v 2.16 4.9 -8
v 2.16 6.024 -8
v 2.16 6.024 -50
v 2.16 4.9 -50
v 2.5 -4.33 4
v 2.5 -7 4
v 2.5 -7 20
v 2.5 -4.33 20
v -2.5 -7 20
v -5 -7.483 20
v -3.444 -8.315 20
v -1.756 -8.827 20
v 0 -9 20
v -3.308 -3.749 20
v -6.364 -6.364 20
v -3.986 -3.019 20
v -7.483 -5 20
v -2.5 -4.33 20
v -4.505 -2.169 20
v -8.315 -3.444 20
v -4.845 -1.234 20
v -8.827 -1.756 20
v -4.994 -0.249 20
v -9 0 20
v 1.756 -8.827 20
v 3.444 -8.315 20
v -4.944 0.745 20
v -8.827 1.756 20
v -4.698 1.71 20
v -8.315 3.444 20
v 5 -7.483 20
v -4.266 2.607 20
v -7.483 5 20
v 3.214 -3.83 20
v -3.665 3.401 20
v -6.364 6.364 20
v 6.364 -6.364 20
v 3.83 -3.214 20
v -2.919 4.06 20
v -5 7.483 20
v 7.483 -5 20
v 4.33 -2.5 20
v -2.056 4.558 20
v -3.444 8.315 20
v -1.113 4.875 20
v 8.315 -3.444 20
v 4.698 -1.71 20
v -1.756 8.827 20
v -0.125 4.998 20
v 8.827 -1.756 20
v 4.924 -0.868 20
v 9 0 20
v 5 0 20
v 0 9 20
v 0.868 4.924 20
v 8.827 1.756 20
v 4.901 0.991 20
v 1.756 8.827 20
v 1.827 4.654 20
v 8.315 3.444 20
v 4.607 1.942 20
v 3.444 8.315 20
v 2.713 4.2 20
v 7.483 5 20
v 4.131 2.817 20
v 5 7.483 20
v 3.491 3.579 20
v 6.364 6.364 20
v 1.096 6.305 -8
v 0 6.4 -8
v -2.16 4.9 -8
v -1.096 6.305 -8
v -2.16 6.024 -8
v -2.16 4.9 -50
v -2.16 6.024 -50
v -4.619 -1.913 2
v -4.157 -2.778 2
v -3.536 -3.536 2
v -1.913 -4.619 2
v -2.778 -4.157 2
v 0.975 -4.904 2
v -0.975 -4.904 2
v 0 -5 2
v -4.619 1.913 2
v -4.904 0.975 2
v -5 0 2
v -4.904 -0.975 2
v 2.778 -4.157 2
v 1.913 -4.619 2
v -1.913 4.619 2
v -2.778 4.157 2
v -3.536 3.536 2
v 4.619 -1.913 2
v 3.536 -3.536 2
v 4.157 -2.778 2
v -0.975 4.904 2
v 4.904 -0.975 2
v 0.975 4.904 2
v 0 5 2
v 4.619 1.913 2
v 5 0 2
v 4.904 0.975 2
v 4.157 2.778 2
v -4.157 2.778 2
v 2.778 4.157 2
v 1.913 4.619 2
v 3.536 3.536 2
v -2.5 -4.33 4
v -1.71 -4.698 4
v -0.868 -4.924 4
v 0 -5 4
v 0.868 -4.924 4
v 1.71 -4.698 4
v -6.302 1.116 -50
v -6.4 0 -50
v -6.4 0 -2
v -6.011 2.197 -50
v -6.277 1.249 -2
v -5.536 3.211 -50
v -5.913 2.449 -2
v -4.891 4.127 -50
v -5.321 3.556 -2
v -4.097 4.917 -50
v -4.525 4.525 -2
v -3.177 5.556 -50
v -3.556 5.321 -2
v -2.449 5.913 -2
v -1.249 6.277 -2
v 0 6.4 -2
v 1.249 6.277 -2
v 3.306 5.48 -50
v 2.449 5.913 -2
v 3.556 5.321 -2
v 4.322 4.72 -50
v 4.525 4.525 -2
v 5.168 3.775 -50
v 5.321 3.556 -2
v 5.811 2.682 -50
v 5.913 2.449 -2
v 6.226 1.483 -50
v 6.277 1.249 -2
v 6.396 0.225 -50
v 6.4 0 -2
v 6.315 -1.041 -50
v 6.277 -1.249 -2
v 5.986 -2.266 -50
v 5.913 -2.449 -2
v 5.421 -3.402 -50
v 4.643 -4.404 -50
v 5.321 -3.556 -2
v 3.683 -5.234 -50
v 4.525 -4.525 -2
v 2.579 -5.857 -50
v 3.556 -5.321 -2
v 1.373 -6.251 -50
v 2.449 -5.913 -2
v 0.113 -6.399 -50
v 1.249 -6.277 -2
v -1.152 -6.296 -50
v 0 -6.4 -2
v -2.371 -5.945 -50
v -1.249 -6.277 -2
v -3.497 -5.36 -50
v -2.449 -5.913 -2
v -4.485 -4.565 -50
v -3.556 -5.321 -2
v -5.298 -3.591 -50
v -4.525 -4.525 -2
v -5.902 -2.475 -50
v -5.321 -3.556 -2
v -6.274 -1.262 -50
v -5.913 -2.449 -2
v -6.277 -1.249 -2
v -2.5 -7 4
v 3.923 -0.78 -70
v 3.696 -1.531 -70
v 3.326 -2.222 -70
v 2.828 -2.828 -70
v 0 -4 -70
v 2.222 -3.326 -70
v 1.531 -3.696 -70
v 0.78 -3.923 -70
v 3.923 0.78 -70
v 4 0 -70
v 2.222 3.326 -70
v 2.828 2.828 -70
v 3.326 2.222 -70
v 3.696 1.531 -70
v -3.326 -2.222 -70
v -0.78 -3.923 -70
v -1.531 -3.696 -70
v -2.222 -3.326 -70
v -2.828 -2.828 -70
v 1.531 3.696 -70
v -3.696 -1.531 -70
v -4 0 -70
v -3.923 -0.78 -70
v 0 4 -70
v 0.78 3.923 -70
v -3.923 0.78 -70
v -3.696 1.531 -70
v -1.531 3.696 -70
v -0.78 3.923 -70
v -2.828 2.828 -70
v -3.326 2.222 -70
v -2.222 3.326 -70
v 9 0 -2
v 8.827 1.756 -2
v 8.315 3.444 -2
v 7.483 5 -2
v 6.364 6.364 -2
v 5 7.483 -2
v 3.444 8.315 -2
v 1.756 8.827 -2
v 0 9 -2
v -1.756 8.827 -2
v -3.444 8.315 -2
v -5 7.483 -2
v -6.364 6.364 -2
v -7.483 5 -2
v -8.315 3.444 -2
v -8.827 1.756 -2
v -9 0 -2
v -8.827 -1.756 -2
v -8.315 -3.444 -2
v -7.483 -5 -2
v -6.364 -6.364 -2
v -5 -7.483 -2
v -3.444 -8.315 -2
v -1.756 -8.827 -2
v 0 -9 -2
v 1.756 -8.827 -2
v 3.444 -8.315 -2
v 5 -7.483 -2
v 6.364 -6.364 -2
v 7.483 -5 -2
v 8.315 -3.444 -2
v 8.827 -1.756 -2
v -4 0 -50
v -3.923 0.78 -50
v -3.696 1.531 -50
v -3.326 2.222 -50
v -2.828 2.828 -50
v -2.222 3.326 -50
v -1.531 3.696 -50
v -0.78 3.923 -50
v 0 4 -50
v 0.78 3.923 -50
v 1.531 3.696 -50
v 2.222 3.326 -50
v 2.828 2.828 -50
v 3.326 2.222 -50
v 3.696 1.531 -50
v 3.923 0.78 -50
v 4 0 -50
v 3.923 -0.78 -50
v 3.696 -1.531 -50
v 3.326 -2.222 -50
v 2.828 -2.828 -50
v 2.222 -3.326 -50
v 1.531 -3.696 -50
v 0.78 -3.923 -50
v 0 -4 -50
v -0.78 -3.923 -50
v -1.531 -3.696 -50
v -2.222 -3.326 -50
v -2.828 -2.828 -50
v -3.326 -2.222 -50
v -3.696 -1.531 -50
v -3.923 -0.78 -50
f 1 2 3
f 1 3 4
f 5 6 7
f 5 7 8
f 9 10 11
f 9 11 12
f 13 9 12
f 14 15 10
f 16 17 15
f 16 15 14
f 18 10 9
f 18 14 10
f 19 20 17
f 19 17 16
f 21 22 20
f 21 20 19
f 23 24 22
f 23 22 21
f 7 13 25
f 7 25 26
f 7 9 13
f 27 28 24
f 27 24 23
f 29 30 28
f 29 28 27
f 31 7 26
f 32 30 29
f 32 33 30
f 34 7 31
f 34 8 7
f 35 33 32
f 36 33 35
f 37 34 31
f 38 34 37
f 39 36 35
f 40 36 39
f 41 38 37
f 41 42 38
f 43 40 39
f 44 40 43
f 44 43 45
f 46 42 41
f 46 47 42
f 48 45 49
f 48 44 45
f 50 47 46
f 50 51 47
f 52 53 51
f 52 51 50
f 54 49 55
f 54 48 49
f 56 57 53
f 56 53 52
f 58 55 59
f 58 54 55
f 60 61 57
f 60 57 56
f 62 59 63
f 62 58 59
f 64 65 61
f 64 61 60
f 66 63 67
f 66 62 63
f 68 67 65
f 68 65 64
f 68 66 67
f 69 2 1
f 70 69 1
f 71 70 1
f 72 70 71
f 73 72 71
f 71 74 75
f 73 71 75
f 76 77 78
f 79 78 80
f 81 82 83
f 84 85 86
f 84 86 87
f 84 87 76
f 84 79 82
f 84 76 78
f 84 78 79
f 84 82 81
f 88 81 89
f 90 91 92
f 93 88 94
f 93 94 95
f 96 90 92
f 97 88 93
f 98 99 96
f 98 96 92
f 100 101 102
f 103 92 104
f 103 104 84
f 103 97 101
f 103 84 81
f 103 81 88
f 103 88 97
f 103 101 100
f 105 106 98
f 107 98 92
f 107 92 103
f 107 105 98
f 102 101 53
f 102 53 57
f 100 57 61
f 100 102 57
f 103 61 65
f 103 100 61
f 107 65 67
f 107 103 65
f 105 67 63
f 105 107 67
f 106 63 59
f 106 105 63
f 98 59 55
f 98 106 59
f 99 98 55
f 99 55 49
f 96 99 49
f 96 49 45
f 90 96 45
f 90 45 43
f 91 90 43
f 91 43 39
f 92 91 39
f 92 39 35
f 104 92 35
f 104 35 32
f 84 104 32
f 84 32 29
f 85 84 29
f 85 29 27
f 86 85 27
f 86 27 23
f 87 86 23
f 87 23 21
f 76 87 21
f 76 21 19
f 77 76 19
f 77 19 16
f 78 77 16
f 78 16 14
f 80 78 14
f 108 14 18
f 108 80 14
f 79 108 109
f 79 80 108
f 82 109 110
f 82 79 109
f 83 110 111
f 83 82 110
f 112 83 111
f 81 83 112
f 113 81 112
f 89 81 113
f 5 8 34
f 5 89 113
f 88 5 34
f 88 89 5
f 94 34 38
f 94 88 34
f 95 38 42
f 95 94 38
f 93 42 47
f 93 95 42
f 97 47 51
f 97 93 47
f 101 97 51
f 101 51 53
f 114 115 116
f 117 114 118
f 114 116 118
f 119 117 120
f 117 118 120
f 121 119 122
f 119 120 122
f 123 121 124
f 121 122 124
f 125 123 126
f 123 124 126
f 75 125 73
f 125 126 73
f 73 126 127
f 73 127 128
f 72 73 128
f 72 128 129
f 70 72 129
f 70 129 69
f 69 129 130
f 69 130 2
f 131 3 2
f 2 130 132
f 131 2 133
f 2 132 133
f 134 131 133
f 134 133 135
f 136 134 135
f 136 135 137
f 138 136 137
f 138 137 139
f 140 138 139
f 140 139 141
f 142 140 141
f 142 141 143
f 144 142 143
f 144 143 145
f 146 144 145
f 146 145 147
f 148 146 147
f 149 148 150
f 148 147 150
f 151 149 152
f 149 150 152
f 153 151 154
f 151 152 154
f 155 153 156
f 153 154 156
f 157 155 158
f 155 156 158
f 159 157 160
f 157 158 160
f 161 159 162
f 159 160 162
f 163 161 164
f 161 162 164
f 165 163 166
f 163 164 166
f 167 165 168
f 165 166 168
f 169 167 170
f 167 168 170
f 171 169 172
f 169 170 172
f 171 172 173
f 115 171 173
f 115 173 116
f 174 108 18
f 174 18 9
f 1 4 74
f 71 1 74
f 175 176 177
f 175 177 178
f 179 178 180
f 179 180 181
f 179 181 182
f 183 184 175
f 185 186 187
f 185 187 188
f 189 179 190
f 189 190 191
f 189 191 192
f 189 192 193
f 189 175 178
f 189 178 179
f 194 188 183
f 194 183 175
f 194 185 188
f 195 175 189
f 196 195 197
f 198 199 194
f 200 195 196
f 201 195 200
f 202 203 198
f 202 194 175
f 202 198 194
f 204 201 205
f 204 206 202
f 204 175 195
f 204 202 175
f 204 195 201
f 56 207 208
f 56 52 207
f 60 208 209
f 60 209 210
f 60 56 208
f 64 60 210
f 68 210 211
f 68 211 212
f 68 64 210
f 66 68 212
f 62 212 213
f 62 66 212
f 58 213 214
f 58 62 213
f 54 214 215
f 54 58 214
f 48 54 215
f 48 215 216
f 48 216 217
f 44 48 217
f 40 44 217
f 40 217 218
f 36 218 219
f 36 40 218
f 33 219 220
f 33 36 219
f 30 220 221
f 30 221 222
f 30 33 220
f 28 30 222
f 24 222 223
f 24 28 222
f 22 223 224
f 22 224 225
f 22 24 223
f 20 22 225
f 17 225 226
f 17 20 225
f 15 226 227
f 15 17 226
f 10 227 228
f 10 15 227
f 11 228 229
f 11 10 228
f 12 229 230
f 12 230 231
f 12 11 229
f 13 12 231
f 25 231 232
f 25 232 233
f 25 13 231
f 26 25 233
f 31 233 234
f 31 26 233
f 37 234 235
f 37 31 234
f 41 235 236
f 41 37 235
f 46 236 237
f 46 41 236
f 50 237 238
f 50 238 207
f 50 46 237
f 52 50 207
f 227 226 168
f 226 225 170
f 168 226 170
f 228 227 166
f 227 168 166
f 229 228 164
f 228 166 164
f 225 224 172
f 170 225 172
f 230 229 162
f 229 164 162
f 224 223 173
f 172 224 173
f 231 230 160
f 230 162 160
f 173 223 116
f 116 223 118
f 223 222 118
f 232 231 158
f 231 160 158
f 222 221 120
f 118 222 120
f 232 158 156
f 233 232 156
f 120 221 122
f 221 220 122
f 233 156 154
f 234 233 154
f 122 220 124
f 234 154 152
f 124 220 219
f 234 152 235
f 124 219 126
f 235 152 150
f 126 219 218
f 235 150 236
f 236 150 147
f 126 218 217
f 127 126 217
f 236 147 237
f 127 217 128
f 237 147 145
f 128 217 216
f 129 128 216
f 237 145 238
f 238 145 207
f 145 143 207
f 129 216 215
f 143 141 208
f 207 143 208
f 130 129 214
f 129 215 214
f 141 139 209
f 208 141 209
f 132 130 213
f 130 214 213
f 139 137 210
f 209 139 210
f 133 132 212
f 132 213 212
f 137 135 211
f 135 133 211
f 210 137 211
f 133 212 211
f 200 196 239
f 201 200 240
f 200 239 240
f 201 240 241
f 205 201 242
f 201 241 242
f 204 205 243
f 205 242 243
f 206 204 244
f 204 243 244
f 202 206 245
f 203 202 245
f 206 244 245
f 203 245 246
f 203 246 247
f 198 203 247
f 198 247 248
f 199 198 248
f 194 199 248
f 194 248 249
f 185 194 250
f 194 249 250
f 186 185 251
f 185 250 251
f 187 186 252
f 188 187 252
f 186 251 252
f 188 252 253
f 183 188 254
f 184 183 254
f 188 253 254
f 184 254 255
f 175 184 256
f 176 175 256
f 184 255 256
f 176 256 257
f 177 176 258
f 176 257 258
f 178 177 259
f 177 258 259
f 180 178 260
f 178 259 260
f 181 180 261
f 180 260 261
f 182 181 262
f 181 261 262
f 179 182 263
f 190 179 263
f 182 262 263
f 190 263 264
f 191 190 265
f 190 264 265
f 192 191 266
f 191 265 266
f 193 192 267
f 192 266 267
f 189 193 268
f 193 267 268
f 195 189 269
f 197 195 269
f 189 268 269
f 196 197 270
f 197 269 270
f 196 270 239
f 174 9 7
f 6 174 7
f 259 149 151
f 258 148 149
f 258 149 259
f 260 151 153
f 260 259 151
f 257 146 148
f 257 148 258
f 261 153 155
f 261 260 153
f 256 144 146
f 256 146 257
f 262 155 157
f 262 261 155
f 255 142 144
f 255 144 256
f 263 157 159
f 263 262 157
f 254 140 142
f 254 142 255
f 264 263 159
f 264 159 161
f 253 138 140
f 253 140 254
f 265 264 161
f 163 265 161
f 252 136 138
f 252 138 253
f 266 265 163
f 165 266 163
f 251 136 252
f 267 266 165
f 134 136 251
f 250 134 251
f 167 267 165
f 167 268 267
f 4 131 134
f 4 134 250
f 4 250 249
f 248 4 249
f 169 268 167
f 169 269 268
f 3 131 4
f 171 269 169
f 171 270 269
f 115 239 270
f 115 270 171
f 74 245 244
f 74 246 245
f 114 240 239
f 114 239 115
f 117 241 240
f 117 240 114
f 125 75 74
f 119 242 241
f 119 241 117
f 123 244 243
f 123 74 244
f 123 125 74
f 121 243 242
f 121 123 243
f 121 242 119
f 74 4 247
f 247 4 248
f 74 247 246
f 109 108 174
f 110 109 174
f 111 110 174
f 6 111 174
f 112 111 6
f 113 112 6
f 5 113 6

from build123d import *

# Parameters (mm, degrees)
SKETCH1_R           = 9
SKETCH1_R_2         = 5
BOSS_EXTRUDE1_DEPTH = 20
SKETCH3_R           = 6.4
BOSS_EXTRUDE2_DEPTH = 50
CUT_EXTRUDE2_DEPTH  = 16
BOSS_EXTRUDE3_START = -2
SKETCH1_3_R         = 9
BOSS_EXTRUDE3_DEPTH = 2
SKETCH1_4_R         = 5
BOSS_EXTRUDE4_DEPTH = 2
CUT_EXTRUDE3_DEPTH  = 42
SKETCH10_R          = 4
BOSS_EXTRUDE5_DEPTH = 20


with BuildPart() as part:
    # Sketch1 → Boss-Extrude1 (new body)
    with BuildSketch(Plane.XY):
        Circle(SKETCH1_R)
        Circle(SKETCH1_R_2, mode=Mode.SUBTRACT)
    extrude(amount=BOSS_EXTRUDE1_DEPTH)

    # Sketch3 → Boss-Extrude2 (add)
    with BuildSketch(Plane(origin=(0, 0, 0), x_dir=(-1, 0, 0), z_dir=(0, 0, -1))):
        Circle(SKETCH3_R)
    extrude(amount=BOSS_EXTRUDE2_DEPTH)

    # Sketch8 → Cut-Extrude2 (cut)
    with BuildSketch(Plane.XY.offset(20)):
        Polygon((0, -7), (2.5, -7), (2.5, -4.330127019), (-2.5, -4.330127019), (-2.5, -7), align=None)
    extrude(amount=-CUT_EXTRUDE2_DEPTH, mode=Mode.SUBTRACT)

    # Sketch1<3> → Boss-Extrude3 (add)
    with BuildSketch(Plane.XY.offset(BOSS_EXTRUDE3_START)):
        Circle(SKETCH1_3_R)
    extrude(amount=BOSS_EXTRUDE3_DEPTH)

    # Sketch1<4> → Boss-Extrude4 (add)
    with BuildSketch(Plane.XY):
        Circle(SKETCH1_4_R)
    extrude(amount=BOSS_EXTRUDE4_DEPTH)

    # Sketch9 → Cut-Extrude3 (cut)
    with BuildSketch(Plane(origin=(0, 0, -50), x_dir=(-1, 0, 0), z_dir=(0, 0, -1))):
        Polygon((0, 4.9), (2.16, 4.9), (2.16, 6.02448338), (0.743273512, 7.441209868), (-1.718196928, 7.441209868), (-2.16, 6.02448338), (-2.16, 4.9), align=None)
    extrude(amount=-CUT_EXTRUDE3_DEPTH, mode=Mode.SUBTRACT)

    # Sketch10 → Boss-Extrude5 (add)
    with BuildSketch(Plane(origin=(0, 0, -50), x_dir=(-1, 0, 0), z_dir=(0, 0, -1))):
        Circle(SKETCH10_R)
    extrude(amount=BOSS_EXTRUDE5_DEPTH)


solid = part.part
